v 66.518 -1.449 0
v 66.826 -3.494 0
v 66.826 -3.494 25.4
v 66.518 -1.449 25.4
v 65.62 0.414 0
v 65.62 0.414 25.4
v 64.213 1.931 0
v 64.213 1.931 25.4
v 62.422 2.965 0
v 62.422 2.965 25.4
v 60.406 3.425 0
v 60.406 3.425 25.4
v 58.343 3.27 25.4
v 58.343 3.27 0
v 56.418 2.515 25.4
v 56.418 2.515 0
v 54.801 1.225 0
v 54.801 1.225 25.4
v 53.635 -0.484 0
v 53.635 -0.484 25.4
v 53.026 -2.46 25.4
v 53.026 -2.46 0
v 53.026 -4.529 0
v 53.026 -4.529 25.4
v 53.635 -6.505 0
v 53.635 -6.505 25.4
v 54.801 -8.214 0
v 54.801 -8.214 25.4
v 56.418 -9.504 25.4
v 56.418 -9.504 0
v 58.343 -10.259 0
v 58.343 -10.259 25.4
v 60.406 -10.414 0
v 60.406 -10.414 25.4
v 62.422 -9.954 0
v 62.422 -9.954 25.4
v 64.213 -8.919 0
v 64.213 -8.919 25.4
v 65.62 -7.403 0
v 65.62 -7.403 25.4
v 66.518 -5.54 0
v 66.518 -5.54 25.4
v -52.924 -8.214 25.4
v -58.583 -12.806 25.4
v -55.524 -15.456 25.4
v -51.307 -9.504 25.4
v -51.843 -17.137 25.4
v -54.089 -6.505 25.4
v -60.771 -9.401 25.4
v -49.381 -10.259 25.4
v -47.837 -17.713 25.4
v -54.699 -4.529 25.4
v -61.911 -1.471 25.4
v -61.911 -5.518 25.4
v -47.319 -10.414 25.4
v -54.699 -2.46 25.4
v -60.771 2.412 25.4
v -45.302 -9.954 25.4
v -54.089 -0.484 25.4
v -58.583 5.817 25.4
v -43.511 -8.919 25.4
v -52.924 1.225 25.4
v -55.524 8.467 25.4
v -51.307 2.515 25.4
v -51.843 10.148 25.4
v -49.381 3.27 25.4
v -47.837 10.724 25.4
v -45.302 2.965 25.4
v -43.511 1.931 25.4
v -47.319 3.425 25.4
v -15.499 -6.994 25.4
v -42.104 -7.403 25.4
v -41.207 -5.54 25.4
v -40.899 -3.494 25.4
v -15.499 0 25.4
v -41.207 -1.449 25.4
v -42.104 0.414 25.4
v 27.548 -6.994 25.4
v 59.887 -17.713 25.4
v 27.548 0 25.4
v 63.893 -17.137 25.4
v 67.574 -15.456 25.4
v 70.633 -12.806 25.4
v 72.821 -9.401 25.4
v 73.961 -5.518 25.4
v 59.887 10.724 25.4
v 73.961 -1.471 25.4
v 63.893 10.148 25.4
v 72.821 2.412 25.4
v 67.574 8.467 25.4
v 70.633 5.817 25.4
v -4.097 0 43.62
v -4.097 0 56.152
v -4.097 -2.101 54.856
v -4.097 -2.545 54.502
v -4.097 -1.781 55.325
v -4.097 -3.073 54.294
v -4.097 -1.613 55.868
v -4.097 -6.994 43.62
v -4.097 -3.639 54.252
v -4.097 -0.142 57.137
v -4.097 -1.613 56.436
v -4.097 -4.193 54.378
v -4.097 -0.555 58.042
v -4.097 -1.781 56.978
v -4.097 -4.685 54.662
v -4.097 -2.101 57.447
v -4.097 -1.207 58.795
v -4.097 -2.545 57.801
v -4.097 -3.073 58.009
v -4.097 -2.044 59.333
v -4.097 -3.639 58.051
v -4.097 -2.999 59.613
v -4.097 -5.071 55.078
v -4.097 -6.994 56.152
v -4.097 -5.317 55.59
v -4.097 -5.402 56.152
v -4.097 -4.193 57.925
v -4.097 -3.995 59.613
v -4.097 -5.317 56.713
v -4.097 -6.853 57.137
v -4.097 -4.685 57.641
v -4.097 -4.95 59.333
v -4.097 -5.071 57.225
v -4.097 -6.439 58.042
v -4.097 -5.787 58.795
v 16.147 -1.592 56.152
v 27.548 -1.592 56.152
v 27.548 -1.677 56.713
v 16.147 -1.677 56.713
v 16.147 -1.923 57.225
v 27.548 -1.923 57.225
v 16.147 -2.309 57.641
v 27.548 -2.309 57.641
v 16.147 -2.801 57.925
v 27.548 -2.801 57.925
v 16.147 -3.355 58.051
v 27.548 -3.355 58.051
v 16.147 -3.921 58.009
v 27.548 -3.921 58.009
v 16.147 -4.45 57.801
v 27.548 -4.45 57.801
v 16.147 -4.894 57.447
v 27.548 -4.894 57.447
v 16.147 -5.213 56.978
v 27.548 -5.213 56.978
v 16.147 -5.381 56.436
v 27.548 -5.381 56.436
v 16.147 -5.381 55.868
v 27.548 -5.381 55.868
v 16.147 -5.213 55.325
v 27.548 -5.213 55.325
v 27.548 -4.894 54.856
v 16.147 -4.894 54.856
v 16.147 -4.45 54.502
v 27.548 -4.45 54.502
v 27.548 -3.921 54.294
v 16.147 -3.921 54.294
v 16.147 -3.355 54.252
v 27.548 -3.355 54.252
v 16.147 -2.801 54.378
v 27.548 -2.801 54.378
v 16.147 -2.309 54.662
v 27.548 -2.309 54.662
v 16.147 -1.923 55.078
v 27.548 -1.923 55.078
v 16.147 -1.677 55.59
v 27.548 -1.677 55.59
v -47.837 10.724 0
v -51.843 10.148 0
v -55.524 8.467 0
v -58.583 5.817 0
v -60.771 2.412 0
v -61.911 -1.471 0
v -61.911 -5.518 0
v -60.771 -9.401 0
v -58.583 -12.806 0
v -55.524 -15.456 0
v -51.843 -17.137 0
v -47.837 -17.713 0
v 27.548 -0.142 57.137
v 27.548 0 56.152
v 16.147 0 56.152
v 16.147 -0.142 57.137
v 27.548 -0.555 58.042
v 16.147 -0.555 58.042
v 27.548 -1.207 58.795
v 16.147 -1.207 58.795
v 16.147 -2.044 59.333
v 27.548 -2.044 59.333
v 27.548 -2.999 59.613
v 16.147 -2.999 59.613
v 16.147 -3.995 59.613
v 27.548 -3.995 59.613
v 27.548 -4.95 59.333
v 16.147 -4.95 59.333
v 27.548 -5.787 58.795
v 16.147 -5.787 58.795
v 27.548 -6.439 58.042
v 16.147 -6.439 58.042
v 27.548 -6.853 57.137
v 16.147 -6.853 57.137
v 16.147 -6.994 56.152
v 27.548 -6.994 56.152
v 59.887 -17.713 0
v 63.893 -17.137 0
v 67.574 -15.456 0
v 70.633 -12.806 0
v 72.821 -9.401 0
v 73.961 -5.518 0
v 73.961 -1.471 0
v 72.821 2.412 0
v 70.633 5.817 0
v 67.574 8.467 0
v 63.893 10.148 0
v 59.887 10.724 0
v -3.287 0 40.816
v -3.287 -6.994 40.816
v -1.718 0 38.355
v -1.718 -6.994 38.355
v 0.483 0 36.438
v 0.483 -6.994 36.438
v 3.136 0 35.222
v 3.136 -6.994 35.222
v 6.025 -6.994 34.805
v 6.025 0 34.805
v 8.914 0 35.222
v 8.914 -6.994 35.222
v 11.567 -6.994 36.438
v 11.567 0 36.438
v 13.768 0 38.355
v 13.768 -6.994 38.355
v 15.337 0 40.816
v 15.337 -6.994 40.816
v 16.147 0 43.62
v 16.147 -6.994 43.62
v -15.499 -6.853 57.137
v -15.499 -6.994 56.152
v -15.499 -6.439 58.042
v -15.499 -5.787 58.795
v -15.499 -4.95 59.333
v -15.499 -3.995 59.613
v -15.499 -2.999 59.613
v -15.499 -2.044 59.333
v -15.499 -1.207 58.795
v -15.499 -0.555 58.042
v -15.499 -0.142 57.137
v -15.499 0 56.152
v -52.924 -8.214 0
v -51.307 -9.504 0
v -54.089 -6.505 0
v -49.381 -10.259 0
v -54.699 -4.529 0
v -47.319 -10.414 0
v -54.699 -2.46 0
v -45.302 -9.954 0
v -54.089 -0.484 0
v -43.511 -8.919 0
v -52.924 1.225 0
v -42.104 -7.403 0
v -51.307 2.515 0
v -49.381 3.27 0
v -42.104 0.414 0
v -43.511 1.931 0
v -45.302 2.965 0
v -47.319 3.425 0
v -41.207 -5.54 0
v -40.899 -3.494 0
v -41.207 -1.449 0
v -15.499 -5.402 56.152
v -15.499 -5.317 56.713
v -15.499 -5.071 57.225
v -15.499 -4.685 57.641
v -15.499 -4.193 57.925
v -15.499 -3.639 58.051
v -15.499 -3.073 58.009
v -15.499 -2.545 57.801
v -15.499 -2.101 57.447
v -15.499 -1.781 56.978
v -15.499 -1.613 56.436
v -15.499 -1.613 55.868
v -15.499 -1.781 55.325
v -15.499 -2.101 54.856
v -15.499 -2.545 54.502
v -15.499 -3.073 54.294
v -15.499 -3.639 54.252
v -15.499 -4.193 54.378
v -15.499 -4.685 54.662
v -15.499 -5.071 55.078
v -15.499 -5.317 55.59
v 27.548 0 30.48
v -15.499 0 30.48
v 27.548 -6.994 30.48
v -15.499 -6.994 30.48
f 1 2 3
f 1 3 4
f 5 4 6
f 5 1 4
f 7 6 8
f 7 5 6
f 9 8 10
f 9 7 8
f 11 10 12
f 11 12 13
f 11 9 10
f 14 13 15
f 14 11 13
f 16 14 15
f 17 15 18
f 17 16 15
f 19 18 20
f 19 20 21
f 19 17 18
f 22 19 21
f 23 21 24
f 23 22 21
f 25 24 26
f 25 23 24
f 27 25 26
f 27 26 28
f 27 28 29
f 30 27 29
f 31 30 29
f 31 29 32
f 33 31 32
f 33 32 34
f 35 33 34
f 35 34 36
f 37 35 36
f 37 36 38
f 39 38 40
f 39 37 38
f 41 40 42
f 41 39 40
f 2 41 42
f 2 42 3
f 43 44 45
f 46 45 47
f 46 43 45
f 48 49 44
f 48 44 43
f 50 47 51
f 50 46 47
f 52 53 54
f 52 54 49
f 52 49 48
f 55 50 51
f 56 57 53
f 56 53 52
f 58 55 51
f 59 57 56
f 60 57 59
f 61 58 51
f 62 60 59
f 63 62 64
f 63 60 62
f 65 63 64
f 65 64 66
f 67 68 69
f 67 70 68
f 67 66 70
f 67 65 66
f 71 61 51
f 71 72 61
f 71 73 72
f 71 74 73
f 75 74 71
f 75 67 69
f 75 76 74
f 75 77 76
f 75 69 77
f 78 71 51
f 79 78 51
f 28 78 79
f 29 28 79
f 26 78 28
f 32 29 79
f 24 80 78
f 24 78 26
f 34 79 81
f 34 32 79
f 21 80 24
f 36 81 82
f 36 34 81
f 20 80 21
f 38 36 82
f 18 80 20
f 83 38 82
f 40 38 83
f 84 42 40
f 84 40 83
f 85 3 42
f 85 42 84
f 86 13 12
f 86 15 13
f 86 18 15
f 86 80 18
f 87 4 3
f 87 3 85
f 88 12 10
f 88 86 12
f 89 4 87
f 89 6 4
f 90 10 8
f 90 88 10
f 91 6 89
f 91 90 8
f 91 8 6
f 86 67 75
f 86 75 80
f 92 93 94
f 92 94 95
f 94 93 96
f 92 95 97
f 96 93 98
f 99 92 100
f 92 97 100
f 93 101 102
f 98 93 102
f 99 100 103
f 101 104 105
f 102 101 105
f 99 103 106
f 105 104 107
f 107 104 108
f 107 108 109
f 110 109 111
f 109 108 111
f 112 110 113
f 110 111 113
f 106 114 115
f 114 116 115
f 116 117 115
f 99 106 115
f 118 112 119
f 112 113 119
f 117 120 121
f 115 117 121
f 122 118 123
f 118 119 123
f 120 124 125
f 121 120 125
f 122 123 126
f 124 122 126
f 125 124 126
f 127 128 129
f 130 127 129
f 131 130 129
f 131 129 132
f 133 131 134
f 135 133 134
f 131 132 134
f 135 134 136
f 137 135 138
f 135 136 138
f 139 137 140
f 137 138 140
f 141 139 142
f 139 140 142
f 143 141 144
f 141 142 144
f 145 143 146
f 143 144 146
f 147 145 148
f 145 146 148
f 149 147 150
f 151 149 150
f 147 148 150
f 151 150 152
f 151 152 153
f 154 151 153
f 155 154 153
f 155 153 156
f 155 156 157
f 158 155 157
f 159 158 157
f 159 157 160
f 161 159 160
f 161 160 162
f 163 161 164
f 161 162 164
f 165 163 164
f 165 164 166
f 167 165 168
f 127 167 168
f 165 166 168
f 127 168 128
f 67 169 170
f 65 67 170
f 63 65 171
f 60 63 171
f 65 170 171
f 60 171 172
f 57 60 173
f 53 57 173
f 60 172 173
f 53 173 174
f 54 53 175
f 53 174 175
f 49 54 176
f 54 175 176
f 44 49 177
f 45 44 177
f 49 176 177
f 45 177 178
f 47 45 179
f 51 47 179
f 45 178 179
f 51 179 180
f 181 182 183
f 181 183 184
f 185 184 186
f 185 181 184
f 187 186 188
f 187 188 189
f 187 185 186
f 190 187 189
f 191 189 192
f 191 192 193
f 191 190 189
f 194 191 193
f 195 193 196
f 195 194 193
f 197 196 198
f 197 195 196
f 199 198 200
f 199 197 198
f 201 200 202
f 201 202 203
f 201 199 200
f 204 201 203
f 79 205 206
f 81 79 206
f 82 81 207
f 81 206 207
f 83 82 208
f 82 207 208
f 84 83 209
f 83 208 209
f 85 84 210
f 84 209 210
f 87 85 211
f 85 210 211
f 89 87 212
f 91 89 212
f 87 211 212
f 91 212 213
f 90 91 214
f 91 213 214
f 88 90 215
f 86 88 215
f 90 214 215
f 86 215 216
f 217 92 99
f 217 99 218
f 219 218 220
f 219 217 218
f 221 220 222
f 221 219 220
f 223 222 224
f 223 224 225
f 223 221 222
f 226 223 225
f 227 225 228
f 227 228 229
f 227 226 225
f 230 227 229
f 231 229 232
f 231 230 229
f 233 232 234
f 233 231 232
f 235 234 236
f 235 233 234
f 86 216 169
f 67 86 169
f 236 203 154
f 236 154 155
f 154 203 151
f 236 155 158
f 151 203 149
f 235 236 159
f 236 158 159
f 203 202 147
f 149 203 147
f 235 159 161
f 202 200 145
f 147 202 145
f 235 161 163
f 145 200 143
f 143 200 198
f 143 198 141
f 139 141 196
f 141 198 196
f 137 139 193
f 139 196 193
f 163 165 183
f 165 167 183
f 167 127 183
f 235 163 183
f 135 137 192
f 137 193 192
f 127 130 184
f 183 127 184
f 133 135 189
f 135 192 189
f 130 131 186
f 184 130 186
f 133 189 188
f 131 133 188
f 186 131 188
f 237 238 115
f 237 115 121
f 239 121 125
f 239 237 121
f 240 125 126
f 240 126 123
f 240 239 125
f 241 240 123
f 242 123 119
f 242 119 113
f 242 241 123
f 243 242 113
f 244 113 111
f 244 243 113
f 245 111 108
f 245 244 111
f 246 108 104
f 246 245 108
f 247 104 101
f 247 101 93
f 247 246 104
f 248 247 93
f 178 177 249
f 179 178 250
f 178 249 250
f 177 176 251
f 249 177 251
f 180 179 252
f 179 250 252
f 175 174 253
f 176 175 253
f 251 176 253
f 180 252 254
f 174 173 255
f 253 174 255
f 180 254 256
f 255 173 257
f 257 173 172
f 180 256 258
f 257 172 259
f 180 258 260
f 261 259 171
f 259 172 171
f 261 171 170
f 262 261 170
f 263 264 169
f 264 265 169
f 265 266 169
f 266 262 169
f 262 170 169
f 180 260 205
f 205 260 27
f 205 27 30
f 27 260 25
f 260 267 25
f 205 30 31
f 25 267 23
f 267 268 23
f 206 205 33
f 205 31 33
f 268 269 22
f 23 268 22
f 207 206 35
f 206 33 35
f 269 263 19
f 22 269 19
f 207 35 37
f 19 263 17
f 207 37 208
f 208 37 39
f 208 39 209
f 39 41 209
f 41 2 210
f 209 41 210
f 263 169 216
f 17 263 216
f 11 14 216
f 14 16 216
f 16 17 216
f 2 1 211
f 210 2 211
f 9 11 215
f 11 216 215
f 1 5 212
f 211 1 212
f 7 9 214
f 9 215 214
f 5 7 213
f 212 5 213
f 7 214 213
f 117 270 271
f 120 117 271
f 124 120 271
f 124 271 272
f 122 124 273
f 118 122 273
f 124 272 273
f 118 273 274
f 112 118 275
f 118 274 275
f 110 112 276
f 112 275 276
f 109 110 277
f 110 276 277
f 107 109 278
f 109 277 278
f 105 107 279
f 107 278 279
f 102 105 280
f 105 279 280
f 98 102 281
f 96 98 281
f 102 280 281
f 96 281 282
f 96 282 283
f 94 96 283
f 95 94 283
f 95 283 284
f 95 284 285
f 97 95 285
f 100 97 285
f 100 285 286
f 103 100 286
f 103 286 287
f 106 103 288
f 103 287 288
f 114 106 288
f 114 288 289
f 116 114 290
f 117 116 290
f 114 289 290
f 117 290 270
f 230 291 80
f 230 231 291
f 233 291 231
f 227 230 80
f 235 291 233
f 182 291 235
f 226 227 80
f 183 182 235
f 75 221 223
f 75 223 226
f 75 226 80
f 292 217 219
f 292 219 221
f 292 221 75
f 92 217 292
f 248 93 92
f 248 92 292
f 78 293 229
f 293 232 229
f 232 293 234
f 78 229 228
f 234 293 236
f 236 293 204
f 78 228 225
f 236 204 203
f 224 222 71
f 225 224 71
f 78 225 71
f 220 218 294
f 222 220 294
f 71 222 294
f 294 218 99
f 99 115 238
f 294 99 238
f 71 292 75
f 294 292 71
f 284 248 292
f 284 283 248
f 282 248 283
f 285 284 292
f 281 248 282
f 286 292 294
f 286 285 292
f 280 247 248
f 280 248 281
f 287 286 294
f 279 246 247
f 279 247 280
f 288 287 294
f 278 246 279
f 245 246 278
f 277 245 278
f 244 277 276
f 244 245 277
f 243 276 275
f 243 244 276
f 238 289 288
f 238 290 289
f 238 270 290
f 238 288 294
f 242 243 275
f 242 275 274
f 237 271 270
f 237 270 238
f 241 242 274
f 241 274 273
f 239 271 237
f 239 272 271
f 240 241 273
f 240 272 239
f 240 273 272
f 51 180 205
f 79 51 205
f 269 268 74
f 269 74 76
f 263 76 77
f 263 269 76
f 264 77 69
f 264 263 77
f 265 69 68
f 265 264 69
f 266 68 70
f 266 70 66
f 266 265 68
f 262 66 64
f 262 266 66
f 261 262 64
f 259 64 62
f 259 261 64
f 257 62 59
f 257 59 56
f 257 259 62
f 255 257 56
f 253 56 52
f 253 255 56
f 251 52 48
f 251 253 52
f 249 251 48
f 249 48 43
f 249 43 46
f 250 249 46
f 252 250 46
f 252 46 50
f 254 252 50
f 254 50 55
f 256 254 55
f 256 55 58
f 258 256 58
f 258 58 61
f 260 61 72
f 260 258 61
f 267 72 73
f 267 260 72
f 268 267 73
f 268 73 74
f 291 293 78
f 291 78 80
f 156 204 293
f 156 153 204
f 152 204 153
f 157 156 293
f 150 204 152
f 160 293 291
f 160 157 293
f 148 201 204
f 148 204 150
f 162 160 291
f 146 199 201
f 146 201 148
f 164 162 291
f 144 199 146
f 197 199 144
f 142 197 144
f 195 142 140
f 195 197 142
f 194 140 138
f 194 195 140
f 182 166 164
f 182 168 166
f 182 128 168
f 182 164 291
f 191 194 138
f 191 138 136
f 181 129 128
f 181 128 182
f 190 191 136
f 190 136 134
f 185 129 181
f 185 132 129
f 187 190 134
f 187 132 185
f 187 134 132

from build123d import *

# Parameters (mm, degrees)
F0_R      = 6.9387858197
F1_DEPTH  = 25.4
F2_W      = 43.0467336029
F2_H      = 6.9942568773
F3_DEPTH  = 5.08
F5_DEPTH  = 6.9942568773
F7_DEPTH  = 11.4016152248
F9_DEPTH  = 11.4016152248
F10_R     = 1.905
F11_DEPTH = 11.4016152248
F12_R     = 1.905
F13_DEPTH = 11.4016152248


with BuildPart() as f1:
    # F0 (on Top) → F1 (new body)
    with BuildSketch(Plane.XY):
        with BuildLine():
            Line((59.8869994283, 10.7242316008), (-47.837305814, 10.7242316008))
            ThreePointArc((-47.837305814, 10.7242316008), (-62.055950053, -3.4944126382), (-47.837305814, -17.7130568773))
            Line((-47.837305814, -17.7130568773), (59.8869994283, -17.7130568773))
            ThreePointArc((59.8869994283, -17.7130568773), (74.1056436673, -3.4944126382), (59.8869994283, 10.7242316008))
        make_face()
        with Locations((-47.837305814, -3.4944126382)):
            Circle(F0_R, mode=Mode.SUBTRACT)
        with Locations((59.8869994283, -3.4944126382)):
            Circle(F0_R, mode=Mode.SUBTRACT)
    extrude(amount=F1_DEPTH)

    # F2 (on face) → F3 (join)
    with BuildSketch(Plane.XY.offset(25.4)):
        with Locations((6.0248468071, -3.4971284386)):
            Rectangle(F2_W, F2_H)
    extrude(amount=F3_DEPTH)

    # F4 (on face) → F5 (join, through all)
    with BuildSketch(Plane(origin=(0, 0, 0), x_dir=(-1, 0, 0), z_dir=(0, 1, 0))):
        with BuildLine():
            Line((-27.5482136086, 56.1515986919), (-27.5482136086, 30.48))
            Line((-27.5482136086, 30.48), (15.4985199943, 30.48))
            Line((15.4985199943, 30.48), (15.4985199943, 56.1515986919))
            Line((15.4985199943, 56.1515986919), (4.0969047695, 56.1515986919))
            Line((4.0969047695, 56.1515986919), (4.0969047695, 43.6199121177))
            ThreePointArc((4.0969047695, 43.6199121177), (-6.0248468071, 34.804850773), (-16.1465983838, 43.6199121177))
            Line((-16.1465983838, 43.6199121177), (-16.1465983838, 56.1515986919))
            Line((-16.1465983838, 56.1515986919), (-27.5482136086, 56.1515986919))
        make_face()
    extrude(amount=-F5_DEPTH)

    # F6 (on face) → F7 (join, through all)
    with BuildSketch(Plane.YZ.offset(27.5482136086)):
        with BuildLine():
            Line((-6.9942568773, 56.1515986919), (0, 56.1515986919))
            ThreePointArc((0, 56.1515986919), (-3.4971284386, 59.6487271306), (-6.9942568773, 56.1515986919))
        make_face()
    extrude(amount=-F7_DEPTH)

    # F8 (on face) → F9 (join, through all)
    with BuildSketch(Plane(origin=(-15.4985199943, 0, 0), x_dir=(0, -1, 0), z_dir=(-1, 0, 0))):
        with BuildLine():
            Line((0, 56.1515986919), (6.9942568773, 56.1515986919))
            ThreePointArc((6.9942568773, 56.1515986919), (3.4971284386, 59.6487271306), (0, 56.1515986919))
        make_face()
    extrude(amount=-F9_DEPTH)

    # F10 (on face) → F11 (cut, through all)
    with BuildSketch(Plane.YZ.offset(27.5482136086)):
        with Locations((-3.4971284386, 56.1515986919)):
            Circle(F10_R)
    extrude(amount=-F11_DEPTH, mode=Mode.SUBTRACT)

    # F12 (on face) → F13 (cut, through all)
    with BuildSketch(Plane(origin=(-15.4985199943, 0, 0), x_dir=(0, -1, 0), z_dir=(-1, 0, 0))):
        with Locations((3.4971284386, 56.1515986919)):
            Circle(F12_R)
    extrude(amount=-F13_DEPTH, mode=Mode.SUBTRACT)


solid = f1.part
